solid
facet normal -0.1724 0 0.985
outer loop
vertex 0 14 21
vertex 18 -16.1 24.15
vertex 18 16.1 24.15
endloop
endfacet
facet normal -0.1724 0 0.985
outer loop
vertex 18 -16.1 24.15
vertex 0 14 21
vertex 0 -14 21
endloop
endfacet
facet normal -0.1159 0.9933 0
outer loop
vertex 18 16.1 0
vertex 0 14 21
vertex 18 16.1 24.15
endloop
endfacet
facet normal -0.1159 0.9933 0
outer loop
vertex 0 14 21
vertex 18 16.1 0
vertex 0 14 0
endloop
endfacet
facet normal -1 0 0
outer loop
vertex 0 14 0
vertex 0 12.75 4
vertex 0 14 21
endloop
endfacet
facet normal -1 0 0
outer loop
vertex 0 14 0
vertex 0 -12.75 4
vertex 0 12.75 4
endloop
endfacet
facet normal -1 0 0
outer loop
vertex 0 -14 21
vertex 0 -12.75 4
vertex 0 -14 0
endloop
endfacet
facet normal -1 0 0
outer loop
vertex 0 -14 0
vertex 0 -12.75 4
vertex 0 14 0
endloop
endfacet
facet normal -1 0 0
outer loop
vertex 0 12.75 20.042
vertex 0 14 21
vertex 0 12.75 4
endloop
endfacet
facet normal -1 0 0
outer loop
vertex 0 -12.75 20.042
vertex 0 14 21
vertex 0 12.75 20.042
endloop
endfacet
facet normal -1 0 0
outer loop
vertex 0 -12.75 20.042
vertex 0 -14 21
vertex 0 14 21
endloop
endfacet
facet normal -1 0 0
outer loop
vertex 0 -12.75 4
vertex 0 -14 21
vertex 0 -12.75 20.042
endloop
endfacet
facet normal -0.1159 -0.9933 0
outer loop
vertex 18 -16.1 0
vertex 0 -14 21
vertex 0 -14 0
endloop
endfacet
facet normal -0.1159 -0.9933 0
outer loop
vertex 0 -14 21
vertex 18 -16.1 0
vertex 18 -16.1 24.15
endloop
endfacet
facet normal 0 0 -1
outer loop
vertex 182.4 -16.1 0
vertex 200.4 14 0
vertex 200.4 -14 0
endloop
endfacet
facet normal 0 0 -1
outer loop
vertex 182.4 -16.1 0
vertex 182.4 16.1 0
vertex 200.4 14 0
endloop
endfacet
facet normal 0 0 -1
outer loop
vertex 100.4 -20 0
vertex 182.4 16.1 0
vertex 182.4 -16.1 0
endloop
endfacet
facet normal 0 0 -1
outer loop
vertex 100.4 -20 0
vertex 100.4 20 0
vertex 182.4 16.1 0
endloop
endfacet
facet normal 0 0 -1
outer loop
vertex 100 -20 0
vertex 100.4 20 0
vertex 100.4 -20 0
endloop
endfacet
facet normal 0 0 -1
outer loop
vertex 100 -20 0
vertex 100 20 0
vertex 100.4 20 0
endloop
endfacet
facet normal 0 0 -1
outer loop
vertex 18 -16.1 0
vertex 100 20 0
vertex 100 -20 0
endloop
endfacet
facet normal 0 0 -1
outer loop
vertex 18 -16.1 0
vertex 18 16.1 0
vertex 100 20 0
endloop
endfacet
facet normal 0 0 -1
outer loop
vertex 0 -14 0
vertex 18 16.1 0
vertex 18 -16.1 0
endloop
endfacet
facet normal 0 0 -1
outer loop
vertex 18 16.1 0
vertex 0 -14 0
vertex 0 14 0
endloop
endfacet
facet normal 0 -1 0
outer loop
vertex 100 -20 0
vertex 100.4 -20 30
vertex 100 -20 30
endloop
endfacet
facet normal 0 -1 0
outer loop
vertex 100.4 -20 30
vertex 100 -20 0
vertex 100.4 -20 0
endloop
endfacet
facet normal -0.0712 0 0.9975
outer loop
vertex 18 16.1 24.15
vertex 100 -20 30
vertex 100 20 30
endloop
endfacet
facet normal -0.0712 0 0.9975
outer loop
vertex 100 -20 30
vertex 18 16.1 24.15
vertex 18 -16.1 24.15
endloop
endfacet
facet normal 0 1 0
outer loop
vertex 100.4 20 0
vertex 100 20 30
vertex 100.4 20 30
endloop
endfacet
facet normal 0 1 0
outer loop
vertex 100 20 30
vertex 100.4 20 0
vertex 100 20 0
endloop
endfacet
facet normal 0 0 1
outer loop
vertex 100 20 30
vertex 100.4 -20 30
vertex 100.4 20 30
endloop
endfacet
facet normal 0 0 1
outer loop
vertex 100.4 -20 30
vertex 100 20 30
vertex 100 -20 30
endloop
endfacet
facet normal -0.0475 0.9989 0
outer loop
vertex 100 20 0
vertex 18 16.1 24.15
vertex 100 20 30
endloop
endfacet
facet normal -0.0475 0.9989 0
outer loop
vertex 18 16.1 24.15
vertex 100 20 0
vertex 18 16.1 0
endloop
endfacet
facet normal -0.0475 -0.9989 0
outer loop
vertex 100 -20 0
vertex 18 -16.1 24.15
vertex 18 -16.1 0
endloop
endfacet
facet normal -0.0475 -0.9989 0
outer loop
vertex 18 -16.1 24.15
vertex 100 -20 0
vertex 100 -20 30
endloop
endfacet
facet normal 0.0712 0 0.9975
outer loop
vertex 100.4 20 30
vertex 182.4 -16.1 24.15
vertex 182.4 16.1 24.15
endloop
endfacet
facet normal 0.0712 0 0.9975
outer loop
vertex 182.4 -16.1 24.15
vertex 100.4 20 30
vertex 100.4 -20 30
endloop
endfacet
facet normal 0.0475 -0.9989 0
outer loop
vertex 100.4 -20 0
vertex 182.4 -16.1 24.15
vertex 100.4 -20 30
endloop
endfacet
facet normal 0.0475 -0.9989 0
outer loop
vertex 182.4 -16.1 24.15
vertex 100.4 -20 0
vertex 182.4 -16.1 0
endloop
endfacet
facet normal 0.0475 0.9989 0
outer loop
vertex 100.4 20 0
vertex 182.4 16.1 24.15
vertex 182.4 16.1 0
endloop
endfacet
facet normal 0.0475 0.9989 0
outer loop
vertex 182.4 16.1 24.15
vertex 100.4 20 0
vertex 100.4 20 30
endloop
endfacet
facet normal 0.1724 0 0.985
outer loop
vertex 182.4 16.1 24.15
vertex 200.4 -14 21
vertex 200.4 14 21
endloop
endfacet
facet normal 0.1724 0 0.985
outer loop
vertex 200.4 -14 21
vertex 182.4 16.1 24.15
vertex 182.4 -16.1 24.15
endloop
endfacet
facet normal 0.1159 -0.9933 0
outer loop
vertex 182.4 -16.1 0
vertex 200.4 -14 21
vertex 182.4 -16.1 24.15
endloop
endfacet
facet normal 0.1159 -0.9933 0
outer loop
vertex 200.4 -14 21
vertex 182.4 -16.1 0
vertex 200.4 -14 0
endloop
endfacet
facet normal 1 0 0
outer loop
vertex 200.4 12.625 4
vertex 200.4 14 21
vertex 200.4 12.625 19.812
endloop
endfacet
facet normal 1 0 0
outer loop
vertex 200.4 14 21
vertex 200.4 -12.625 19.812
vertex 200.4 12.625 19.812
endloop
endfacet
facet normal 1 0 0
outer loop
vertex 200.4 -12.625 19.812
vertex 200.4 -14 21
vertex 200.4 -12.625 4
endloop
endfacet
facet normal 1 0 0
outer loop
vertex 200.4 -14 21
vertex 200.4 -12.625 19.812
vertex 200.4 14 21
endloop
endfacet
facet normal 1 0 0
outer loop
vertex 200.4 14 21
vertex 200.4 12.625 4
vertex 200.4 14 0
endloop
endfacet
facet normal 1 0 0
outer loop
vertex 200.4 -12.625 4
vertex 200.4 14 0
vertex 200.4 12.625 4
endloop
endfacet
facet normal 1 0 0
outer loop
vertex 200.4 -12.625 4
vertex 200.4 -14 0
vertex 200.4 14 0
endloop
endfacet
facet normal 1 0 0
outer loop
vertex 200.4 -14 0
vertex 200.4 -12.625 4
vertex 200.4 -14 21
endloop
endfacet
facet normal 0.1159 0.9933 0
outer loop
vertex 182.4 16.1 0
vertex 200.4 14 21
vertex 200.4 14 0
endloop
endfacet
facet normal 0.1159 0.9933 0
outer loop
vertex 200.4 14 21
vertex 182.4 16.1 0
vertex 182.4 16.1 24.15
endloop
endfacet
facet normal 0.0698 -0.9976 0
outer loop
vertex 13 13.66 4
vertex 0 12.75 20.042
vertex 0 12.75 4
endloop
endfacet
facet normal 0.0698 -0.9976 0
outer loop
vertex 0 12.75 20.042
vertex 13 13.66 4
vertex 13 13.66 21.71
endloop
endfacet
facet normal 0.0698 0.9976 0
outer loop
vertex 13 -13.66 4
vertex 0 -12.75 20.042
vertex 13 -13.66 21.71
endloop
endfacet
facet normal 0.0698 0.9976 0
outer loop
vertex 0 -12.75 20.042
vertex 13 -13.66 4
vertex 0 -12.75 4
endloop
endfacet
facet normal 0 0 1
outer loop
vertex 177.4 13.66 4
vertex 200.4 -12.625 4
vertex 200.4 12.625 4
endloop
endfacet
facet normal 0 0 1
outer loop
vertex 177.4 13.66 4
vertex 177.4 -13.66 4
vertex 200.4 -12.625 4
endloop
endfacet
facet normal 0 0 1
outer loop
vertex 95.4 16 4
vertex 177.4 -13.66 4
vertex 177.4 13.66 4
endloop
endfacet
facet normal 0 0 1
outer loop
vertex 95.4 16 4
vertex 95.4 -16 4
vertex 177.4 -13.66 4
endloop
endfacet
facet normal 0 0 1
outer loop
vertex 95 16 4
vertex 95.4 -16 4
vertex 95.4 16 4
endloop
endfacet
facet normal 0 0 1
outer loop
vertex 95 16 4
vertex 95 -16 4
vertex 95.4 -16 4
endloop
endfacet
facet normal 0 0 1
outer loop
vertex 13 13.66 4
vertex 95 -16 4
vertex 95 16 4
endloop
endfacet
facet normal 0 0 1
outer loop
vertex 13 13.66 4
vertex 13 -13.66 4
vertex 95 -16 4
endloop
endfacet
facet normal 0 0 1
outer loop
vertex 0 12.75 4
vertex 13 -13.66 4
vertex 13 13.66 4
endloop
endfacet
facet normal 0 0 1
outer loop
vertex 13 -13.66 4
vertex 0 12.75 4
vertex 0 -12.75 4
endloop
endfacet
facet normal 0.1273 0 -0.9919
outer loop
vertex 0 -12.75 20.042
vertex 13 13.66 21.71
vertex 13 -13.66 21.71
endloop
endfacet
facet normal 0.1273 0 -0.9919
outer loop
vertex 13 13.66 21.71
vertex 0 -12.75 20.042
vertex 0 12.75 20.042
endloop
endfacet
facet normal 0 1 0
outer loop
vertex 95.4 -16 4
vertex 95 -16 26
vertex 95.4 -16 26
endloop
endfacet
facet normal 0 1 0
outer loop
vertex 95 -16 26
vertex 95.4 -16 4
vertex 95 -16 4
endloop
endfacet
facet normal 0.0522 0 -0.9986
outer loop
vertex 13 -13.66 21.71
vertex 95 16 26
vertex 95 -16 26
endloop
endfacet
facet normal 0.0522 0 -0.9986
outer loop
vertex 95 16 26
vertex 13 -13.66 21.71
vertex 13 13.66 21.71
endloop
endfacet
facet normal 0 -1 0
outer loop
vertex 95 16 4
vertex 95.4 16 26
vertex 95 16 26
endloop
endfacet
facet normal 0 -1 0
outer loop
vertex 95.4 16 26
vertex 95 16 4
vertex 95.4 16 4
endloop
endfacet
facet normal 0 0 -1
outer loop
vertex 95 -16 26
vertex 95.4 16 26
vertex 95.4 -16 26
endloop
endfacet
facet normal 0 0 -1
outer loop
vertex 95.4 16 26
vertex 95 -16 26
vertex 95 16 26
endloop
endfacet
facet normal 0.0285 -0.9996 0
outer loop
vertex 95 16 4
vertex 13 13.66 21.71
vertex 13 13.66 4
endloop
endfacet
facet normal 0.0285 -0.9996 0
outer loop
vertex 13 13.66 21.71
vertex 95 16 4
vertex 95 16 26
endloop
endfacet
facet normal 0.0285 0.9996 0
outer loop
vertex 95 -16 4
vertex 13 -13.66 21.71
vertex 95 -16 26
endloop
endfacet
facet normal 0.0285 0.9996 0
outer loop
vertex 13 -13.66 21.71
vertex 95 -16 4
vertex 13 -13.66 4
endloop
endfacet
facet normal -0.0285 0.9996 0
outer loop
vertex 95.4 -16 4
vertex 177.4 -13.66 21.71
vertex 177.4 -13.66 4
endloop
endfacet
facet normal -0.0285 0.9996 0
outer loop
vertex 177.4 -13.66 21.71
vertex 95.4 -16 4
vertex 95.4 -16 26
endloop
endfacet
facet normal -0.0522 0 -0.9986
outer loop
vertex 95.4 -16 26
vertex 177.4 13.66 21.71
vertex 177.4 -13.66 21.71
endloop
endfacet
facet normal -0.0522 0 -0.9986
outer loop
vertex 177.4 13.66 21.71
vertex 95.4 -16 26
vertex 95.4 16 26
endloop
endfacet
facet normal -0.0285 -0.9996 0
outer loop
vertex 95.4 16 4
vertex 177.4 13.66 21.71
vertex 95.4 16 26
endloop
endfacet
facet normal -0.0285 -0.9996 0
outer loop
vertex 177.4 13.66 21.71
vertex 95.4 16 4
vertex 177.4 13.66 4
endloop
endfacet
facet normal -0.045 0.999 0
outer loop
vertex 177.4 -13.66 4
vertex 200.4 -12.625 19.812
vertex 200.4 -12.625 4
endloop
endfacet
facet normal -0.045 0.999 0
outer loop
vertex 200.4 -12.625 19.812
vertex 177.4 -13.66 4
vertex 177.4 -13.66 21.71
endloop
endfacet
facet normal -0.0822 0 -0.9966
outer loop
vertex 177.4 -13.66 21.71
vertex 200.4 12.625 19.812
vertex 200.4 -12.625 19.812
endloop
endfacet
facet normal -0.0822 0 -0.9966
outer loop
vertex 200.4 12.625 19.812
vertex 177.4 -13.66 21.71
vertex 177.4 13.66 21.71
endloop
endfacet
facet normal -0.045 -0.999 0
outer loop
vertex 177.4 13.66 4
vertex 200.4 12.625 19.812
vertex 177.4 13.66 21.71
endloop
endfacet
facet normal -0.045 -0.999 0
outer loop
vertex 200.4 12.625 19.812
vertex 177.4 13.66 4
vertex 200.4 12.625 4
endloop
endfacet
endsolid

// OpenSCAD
$fn = 32;

// ----------------------------------------------------------------------
// Faired channel: 200 x 40 x 30 mm, 4 mm walls, faired ends
// ----------------------------------------------------------------------

// --- parameters (mm) ---
length = 200;             // channel length
width = 40;               // channel width at mid length
height = 30;              // channel height at mid length
wall = 4;                 // side wall thickness
floor_t = 4;              // floor thickness
end_w = 28;               // faired end width
end_h = 21;               // faired end height

difference() {
  union() {
    hull() {
      translate([0, -14, 0]) cube([0.4, 28, 21]);
      translate([18, -16.1, 0]) cube([0.4, 32.2, 24.15]);
    }
    hull() {
      translate([18, -16.1, 0]) cube([0.4, 32.2, 24.15]);
      translate([100, -20, 0]) cube([0.4, 40, 30]);
    }
    hull() {
      translate([100, -20, 0]) cube([0.4, 40, 30]);
      translate([182, -16.1, 0]) cube([0.4, 32.2, 24.15]);
    }
    hull() {
      translate([182, -16.1, 0]) cube([0.4, 32.2, 24.15]);
      translate([200, -14, 0]) cube([0.4, 28, 21]);
    }
  }
  /* cavity, 5 mm proud of both ends so the ports are cut clean */
  hull() {
    translate([-5, -12.4, 4]) cube([0.4, 24.8, 15.4]);
    translate([13, -13.66, 4]) cube([0.4, 27.32, 17.71]);
  }
  hull() {
    translate([13, -13.66, 4]) cube([0.4, 27.32, 17.71]);
    translate([95, -16, 4]) cube([0.4, 32, 22]);
  }
  hull() {
    translate([95, -16, 4]) cube([0.4, 32, 22]);
    translate([177, -13.66, 4]) cube([0.4, 27.32, 17.71]);
  }
  hull() {
    translate([177, -13.66, 4]) cube([0.4, 27.32, 17.71]);
    translate([205, -12.4, 4]) cube([0.4, 24.8, 15.4]);
  }
}
